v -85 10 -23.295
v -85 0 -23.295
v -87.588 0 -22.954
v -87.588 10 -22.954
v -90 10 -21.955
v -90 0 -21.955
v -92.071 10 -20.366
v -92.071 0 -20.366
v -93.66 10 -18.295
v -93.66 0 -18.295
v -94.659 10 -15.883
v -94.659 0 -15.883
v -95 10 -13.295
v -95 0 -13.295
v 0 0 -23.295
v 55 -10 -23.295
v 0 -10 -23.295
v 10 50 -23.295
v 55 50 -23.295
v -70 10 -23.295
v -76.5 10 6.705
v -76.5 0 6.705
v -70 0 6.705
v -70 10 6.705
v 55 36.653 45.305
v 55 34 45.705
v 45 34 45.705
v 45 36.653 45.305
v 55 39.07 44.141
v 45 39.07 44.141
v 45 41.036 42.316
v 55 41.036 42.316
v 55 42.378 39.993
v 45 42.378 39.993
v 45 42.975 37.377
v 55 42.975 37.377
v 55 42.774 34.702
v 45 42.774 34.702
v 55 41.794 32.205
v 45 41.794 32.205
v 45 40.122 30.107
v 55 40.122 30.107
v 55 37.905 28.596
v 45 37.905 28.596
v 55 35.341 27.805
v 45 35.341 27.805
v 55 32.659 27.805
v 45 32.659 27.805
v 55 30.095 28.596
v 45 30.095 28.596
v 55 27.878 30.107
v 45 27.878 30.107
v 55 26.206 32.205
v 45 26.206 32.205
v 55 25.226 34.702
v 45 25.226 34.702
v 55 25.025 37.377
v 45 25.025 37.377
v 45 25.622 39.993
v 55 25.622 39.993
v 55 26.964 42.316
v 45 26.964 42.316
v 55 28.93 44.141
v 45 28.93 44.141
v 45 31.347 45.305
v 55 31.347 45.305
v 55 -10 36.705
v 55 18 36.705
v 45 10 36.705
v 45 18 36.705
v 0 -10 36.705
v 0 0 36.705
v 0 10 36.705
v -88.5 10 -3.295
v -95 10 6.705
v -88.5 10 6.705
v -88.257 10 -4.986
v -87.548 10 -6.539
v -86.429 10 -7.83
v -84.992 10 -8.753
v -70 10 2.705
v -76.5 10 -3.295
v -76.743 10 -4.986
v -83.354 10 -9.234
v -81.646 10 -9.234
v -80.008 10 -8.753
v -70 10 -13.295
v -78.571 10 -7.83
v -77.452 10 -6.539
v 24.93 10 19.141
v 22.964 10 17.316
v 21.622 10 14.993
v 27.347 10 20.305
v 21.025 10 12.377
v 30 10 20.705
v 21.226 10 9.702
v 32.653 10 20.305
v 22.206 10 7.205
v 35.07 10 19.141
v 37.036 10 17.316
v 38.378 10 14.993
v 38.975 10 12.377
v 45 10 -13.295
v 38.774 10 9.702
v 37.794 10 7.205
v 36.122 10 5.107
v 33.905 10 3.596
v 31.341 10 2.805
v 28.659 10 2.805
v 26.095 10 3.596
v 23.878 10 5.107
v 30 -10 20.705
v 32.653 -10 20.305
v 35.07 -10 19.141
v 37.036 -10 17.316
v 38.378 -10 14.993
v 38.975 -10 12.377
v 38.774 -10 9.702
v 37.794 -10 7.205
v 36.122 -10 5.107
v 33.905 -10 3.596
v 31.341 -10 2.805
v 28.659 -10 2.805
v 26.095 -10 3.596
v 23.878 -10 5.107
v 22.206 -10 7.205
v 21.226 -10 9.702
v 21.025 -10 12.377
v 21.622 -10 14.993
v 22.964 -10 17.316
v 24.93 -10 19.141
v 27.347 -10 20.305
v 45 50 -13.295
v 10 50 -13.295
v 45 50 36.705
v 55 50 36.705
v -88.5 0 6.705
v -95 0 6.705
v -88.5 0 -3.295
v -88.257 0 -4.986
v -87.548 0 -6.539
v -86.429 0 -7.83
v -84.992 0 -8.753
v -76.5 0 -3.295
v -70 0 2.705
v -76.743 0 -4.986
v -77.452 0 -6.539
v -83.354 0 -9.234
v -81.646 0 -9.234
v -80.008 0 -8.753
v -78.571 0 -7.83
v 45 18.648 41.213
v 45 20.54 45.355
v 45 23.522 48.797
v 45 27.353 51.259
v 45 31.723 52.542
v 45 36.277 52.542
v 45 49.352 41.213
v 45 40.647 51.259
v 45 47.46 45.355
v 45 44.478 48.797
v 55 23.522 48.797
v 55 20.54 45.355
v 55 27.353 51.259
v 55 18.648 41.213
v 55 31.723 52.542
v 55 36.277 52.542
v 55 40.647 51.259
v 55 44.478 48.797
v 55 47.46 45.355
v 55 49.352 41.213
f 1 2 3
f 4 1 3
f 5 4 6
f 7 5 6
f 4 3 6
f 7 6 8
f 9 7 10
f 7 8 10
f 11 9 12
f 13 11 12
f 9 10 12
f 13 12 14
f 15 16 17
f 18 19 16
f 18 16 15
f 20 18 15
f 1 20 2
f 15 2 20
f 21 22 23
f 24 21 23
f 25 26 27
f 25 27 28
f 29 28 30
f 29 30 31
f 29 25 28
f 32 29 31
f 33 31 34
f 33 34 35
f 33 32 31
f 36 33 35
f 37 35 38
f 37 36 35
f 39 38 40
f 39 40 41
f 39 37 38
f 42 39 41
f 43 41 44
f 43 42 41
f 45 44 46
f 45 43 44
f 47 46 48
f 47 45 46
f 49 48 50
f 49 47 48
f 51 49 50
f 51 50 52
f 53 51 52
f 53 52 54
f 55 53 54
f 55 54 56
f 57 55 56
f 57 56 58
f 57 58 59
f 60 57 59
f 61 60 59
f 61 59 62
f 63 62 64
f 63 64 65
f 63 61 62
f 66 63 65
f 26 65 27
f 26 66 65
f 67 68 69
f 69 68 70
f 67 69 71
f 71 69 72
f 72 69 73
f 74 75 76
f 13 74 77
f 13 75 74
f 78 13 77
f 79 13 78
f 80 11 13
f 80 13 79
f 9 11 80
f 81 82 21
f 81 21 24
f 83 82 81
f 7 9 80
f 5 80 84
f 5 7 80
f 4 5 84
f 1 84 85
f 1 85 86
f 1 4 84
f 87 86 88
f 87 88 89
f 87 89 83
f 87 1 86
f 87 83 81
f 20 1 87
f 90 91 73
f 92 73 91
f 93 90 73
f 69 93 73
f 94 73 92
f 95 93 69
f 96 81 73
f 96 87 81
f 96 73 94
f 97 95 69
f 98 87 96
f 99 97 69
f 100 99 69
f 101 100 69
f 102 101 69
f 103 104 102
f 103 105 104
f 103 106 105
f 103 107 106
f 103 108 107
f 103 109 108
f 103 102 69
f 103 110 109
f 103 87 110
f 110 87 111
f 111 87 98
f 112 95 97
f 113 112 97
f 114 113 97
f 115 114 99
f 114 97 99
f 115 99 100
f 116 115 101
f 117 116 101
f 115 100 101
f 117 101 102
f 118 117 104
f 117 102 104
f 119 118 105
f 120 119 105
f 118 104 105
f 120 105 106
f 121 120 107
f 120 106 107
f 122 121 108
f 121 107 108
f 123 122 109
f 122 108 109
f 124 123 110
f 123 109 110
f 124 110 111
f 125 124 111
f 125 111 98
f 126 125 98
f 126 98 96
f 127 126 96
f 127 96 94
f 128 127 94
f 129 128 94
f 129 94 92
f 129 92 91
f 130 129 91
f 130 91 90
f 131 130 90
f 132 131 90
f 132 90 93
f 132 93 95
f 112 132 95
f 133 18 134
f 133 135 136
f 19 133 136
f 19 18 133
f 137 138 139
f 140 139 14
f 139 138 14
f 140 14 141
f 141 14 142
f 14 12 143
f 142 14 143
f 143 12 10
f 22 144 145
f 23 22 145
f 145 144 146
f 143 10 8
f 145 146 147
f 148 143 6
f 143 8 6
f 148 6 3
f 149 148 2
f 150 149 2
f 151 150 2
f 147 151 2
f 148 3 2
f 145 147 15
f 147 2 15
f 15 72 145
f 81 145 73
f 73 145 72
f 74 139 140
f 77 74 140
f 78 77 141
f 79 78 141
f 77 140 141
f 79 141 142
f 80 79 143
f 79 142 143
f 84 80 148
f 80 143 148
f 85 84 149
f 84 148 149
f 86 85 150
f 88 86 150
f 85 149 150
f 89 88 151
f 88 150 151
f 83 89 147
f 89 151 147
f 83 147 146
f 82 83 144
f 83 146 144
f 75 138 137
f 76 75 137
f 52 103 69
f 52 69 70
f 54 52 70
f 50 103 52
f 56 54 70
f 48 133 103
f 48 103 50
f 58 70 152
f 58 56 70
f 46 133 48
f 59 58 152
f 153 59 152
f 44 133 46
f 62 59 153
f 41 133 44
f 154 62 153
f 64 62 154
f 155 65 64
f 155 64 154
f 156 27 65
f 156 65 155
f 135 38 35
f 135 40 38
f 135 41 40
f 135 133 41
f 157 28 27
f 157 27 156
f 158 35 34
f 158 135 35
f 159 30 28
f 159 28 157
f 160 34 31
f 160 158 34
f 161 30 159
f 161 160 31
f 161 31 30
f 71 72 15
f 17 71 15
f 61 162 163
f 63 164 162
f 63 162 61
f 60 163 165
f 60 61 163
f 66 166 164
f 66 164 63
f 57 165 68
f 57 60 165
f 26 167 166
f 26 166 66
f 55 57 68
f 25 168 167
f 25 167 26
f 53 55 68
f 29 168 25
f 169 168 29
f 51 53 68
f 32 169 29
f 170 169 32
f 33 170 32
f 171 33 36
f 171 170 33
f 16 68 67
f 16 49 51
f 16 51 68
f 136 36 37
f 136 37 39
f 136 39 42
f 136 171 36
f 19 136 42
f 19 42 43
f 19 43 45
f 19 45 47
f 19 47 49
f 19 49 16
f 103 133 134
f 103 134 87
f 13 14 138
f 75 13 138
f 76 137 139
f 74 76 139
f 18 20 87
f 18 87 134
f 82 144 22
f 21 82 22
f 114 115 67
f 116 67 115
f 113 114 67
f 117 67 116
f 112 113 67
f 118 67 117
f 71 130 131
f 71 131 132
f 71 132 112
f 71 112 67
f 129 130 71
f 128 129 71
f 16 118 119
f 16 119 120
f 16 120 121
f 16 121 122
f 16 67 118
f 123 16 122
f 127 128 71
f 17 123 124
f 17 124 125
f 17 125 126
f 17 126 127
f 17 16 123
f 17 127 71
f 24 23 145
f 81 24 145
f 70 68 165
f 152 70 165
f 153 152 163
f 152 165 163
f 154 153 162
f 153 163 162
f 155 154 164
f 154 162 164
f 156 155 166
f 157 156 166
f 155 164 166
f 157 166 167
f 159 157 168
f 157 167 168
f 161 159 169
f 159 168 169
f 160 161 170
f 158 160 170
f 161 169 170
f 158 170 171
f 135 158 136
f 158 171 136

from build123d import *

# Parameters (mm, degrees)
BOSS_EXTRUDE1_DEPTH = 10
SKETCH2_R           = 9
BOSS_EXTRUDE2_DEPTH = 10
BOSS_EXTRUDE3_DEPTH = 10
SKETCH4_W           = 55
SKETCH4_H           = 60
BOSS_EXTRUDE4_DEPTH = 10
SKETCH5_R           = 9
CUT_EXTRUDE1_DEPTH  = 38


with BuildPart() as part:
    # Sketch1 → Boss-Extrude1 (new body)
    with BuildSketch(Plane(origin=(0, 0, 0), x_dir=(1, 0, 0), z_dir=(0, 1, 0))):
        with BuildLine():
            Line((0, -36.704850043), (55, -36.704850043))
            Line((55, -36.704850043), (55, 23.295149957))
            Line((55, 23.295149957), (-85, 23.295149957))
            ThreePointArc((-85, 23.295149957), (-92.071067812, 20.366217769), (-95, 13.295149957))
            Line((-95, 13.295149957), (-95, -6.704850043))
            Line((-95, -6.704850043), (-88.5, -6.704850043))
            Line((-88.5, -6.704850043), (-88.5, 3.295149957))
            ThreePointArc((-88.5, 3.295149957), (-82.5, 9.295149957), (-76.5, 3.295149957))
            Line((-76.5, 3.295149957), (-76.5, -6.704850043))
            Line((-76.5, -6.704850043), (-70, -6.704850043))
            Line((-70, -6.704850043), (-70, -2.704850043))
            Line((-70, -2.704850043), (0, -36.704850043))
        make_face()
    extrude(amount=BOSS_EXTRUDE1_DEPTH)

    # Sketch2 → Boss-Extrude2 (add)
    with BuildSketch(Plane.ZY.offset(-55)):
        with BuildLine():
            Line((-23.295149957, 10), (36.704850043, 10))
            Line((36.704850043, 10), (36.704850043, 18))
            ThreePointArc((36.704850043, 18), (52.704850043, 34), (36.704850043, 50))
            Line((36.704850043, 50), (-23.295149957, 50))
            Line((-23.295149957, 50), (-23.295149957, 10))
        make_face()
        with Locations((36.704850043, 34)):
            Circle(SKETCH2_R, mode=Mode.SUBTRACT)
    extrude(amount=BOSS_EXTRUDE2_DEPTH)

    # Sketch3 → Boss-Extrude3 (add)
    with BuildSketch(Plane.XY.offset(-23.295149957)):
        Polygon((45, 10), (-70, 10), (10, 50), (45, 50), (45, 11.165402215), align=None)
    extrude(amount=BOSS_EXTRUDE3_DEPTH)

    # Sketch4 → Boss-Extrude4 (add)
    with BuildSketch(Plane(origin=(0, 0, 0), x_dir=(-1, 0, 0), z_dir=(0, -1, 0))):
        with Locations((-27.5, -6.704850043)):
            Rectangle(SKETCH4_W, SKETCH4_H)
    extrude(amount=BOSS_EXTRUDE4_DEPTH)

    # Sketch5 → Cut-Extrude1 (cut)
    with BuildSketch(Plane(origin=(0, 10, 0), x_dir=(1, 0, 0), z_dir=(0, 1, 0))):
        with Locations(Location((30, -11.704850043, 0), (0, 0, 270))):
            Circle(SKETCH5_R)
    extrude(amount=-CUT_EXTRUDE1_DEPTH, mode=Mode.SUBTRACT)


solid = part.part
